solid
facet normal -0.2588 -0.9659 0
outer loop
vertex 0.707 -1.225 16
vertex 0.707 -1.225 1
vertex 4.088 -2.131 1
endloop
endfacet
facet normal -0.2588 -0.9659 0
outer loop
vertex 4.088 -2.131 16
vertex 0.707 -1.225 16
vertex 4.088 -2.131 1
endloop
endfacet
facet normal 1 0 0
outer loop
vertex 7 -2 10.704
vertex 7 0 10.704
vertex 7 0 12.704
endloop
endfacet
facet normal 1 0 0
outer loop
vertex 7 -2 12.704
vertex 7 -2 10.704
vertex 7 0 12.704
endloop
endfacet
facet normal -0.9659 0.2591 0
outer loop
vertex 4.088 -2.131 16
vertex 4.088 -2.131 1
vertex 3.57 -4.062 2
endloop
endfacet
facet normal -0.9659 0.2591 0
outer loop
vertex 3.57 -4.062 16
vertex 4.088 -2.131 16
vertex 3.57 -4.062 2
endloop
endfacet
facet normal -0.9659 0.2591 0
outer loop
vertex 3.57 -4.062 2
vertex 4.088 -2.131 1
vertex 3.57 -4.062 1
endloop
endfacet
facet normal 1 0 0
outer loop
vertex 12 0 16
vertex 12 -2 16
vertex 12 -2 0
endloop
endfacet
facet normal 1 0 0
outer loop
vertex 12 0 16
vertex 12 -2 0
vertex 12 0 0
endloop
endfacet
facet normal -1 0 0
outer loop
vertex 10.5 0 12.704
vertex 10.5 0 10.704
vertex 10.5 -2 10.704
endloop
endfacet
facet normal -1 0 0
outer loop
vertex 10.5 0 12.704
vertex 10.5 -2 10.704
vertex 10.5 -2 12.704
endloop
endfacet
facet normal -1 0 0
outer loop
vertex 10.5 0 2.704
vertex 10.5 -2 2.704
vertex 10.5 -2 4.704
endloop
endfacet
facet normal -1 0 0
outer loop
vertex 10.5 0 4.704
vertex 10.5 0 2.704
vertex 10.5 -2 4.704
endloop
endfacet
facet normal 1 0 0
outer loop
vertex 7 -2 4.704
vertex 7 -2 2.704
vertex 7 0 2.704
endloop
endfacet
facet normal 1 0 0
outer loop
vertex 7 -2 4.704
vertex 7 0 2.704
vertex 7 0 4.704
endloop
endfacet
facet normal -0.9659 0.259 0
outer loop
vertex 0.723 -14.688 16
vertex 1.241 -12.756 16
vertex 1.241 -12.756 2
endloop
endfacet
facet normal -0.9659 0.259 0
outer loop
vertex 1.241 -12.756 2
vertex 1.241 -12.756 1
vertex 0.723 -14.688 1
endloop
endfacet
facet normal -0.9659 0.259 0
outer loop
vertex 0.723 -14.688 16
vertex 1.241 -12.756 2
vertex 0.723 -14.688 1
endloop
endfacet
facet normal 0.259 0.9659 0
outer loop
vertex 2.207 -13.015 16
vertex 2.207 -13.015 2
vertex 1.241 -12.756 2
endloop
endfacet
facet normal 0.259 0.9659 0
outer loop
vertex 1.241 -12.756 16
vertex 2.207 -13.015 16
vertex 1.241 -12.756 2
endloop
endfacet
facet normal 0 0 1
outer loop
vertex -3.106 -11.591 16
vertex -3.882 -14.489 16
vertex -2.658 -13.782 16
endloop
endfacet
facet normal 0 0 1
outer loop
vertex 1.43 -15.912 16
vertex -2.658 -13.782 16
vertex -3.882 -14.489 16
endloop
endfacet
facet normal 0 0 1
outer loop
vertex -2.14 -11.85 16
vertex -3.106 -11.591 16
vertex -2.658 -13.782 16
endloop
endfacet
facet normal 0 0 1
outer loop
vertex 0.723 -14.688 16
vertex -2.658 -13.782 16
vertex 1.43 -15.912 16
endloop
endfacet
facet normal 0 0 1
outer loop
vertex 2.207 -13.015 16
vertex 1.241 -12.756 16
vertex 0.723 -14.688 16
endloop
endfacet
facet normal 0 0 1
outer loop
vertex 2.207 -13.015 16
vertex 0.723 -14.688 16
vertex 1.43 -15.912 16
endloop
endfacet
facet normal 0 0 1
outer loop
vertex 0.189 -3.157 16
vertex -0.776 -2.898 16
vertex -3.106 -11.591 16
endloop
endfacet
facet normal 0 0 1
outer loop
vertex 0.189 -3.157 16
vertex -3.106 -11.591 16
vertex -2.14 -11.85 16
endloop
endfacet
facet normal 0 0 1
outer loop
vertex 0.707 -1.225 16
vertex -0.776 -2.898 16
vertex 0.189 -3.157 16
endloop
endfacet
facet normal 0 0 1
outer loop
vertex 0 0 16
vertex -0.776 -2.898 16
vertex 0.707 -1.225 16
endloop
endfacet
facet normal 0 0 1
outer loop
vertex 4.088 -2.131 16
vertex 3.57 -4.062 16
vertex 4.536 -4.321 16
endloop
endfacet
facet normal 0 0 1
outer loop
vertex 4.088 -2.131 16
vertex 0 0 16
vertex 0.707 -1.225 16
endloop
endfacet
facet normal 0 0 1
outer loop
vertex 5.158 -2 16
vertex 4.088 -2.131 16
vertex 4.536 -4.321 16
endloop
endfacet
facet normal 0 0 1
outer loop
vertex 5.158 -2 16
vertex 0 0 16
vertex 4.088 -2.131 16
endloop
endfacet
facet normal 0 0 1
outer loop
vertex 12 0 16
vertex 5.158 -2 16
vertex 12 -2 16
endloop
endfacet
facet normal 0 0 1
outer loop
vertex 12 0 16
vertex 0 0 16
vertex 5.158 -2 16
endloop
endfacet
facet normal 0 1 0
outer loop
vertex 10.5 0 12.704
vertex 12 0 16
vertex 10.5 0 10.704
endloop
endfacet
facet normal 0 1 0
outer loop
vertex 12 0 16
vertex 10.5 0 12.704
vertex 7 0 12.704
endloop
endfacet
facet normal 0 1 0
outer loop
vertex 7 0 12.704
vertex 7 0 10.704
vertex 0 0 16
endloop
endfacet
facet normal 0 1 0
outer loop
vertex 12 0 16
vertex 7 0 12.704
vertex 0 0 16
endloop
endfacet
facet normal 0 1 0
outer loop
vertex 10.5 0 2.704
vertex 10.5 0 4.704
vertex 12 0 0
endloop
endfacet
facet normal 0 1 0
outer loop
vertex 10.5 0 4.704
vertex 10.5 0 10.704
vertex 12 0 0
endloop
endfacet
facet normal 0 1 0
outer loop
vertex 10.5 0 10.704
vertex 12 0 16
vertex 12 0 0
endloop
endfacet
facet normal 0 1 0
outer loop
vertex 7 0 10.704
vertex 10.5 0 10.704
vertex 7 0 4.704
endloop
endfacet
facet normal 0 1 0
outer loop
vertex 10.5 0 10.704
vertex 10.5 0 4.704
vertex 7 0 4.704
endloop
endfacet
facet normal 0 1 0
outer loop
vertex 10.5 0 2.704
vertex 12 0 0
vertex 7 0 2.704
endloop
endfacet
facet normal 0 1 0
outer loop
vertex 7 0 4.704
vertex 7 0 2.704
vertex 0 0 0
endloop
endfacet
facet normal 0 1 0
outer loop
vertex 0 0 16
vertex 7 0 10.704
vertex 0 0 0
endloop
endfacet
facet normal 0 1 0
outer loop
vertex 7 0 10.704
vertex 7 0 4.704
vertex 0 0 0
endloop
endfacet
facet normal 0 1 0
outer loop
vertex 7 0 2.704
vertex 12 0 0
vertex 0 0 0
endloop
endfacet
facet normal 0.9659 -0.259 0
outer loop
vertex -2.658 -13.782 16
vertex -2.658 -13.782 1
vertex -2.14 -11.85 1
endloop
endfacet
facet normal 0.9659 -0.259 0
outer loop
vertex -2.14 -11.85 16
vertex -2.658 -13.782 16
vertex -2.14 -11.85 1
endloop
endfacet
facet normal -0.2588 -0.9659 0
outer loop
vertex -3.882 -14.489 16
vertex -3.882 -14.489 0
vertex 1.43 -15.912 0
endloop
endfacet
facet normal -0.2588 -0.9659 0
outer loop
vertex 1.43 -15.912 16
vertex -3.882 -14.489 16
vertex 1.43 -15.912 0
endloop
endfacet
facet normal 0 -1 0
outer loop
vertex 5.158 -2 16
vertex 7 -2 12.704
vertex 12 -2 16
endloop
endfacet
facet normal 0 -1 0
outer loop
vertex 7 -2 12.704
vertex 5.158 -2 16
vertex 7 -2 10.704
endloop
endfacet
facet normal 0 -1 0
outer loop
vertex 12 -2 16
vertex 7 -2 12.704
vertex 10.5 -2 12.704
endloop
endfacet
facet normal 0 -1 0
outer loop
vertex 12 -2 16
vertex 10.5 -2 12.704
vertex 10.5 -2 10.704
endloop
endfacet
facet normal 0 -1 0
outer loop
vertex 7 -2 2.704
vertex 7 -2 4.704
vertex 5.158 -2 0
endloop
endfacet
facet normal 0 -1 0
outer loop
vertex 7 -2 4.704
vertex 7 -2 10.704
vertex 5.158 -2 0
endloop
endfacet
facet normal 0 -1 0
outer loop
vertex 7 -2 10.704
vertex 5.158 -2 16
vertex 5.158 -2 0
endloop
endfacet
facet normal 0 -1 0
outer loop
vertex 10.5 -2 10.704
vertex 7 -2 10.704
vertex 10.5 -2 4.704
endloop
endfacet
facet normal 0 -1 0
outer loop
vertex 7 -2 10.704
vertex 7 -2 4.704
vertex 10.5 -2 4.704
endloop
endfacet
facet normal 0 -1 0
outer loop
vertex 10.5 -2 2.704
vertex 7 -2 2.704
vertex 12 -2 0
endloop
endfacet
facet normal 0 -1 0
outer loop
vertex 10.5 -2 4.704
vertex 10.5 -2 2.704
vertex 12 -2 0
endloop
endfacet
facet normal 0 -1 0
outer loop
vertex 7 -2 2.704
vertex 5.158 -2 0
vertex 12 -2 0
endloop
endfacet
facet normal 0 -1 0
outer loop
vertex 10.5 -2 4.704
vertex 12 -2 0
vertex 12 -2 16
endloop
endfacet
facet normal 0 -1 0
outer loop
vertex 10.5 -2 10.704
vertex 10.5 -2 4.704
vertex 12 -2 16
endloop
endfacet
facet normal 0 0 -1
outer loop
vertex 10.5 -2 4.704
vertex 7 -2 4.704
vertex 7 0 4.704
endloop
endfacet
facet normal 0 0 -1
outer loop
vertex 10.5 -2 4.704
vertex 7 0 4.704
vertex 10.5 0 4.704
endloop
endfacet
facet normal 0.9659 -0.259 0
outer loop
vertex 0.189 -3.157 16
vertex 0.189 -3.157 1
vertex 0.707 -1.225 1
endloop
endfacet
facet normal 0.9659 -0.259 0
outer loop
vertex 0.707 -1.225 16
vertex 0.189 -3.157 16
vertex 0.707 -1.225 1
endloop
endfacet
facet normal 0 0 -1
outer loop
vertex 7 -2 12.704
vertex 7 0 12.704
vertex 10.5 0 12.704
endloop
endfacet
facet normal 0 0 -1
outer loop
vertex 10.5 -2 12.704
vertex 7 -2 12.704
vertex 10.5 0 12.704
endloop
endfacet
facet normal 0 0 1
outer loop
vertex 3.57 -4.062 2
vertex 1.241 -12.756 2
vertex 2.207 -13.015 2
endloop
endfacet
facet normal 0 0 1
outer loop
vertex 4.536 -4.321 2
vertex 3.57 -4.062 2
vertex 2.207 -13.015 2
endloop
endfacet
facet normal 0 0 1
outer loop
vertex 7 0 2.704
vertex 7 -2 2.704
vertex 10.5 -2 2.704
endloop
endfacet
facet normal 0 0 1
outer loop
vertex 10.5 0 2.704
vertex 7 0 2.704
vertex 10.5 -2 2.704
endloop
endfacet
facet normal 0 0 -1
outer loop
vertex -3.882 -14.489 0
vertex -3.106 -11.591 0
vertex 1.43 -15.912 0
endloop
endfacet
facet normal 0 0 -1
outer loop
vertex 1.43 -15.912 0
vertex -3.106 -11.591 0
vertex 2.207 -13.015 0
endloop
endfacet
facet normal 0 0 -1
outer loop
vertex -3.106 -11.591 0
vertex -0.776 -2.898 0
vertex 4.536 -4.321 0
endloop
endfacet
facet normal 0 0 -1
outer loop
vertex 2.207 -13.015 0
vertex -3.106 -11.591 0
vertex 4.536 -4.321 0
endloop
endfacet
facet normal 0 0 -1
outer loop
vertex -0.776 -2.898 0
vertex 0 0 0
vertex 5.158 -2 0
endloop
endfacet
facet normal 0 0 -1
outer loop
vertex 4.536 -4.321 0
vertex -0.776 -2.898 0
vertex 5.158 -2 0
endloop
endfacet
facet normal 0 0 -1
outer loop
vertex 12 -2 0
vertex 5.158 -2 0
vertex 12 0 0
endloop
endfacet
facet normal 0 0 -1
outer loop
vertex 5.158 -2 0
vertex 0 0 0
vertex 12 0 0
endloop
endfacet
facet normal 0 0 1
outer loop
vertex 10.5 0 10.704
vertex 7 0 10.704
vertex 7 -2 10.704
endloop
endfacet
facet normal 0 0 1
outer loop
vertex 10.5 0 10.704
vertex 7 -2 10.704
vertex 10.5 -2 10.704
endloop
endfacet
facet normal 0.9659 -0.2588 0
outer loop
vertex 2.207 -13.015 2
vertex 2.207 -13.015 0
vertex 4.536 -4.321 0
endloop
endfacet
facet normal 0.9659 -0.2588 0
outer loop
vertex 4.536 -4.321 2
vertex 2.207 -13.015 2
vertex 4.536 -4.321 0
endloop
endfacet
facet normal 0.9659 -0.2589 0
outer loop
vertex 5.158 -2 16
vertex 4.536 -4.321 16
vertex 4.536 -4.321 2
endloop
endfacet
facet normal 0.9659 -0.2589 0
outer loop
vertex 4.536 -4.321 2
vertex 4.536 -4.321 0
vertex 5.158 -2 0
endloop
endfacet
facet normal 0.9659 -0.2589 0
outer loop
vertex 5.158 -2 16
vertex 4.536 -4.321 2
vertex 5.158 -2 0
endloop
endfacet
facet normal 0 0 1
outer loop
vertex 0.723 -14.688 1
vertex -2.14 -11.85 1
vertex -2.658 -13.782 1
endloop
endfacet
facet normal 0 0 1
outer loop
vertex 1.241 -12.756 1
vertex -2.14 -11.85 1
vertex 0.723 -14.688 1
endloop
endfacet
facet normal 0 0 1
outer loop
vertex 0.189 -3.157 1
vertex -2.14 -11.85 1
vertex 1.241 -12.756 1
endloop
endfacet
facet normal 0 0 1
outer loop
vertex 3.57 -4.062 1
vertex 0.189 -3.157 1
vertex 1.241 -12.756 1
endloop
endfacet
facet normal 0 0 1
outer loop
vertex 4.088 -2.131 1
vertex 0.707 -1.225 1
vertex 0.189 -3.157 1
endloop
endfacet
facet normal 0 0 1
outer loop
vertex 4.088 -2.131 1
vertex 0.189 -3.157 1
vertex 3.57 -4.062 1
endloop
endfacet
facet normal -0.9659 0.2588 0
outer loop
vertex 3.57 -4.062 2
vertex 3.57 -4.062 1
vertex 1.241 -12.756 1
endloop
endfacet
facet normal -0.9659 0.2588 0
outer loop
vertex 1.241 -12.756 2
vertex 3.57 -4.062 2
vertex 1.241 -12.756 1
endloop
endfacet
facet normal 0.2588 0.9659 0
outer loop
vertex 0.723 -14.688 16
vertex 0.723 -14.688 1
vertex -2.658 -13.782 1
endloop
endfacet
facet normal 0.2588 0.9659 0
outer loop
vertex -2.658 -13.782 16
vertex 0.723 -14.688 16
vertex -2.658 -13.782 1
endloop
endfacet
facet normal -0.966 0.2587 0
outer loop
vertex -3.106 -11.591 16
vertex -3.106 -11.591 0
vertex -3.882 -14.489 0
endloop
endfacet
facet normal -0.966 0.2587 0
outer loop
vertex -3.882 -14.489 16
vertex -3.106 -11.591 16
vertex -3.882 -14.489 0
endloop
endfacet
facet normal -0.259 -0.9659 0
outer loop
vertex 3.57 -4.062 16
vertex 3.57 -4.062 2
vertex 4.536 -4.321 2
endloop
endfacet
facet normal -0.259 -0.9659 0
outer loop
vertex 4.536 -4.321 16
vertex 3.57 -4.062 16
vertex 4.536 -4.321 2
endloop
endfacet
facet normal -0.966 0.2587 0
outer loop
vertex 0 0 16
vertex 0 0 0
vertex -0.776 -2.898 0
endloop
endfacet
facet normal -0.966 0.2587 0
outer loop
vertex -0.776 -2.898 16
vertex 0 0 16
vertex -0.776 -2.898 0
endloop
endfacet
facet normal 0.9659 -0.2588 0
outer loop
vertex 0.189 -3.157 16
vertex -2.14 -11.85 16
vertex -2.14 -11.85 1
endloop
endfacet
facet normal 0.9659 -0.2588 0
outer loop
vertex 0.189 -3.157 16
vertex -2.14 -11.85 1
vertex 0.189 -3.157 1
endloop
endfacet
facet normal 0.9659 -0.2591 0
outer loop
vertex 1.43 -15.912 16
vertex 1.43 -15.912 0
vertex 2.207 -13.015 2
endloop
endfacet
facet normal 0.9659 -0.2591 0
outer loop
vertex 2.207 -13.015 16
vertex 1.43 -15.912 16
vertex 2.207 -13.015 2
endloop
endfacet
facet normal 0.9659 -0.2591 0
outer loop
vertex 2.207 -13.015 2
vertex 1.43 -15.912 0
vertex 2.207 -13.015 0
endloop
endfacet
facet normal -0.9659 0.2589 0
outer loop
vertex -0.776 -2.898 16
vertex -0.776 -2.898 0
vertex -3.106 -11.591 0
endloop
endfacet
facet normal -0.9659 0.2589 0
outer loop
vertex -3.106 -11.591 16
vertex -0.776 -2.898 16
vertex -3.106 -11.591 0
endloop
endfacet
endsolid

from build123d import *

# Parameters (mm, degrees)
F1_DEPTH = 16
F2_DEPTH = 1
F3_DEPTH = 2
F4_W     = 3.5
F4_H     = 2
F5_DEPTH = 2.5


with BuildPart() as f1:
    # F0 (on Top) → F1 (new body)
    with BuildSketch(Plane.XY):
        Polygon((5.312592, -1.423505), (0, 0), (-0.776457, -2.897777), (0.189469, -3.156597), (0.707107, -1.224745), (4.087847, -2.130612), (3.570209, -4.062463), (4.536135, -4.321282), (5.158121, -2), align=None)
        Polygon((-2.139903, -11.849929), (-3.105829, -11.59111), (-3.882286, -14.488887), (1.430306, -15.912392), (2.206764, -13.014615), (1.240838, -12.755796), (0.7232, -14.687647), (-2.657541, -13.781781), align=None)
        Polygon((0.189469, -3.156597), (-0.776457, -2.897777), (-3.105829, -11.59111), (-2.139903, -11.849929), align=None)
        Polygon((12, 0), (0, 0), (5.312592, -1.423505), (5.158121, -2), (12, -2), align=None)
    extrude(amount=F1_DEPTH)

    # F0 (on Top) → F2 (join)
    with BuildSketch(Plane.XY):
        Polygon((0.707107, -1.224745), (0.189469, -3.156597), (-2.139903, -11.849929), (-2.657541, -13.781781), (0.7232, -14.687647), (1.240838, -12.755796), (3.570209, -4.062463), (4.087847, -2.130612), align=None)
    extrude(amount=F2_DEPTH)

    # F0 (on Top) → F3 (join)
    with BuildSketch(Plane.XY):
        Polygon((2.206764, -13.014615), (4.536135, -4.321282), (3.570209, -4.062463), (1.240838, -12.755796), align=None)
    extrude(amount=F3_DEPTH)


with BuildPart() as f5:
    # F4 (on Front) → F5 (new body, symmetric)
    with BuildSketch(Plane.XZ):
        with Locations((16.25, 11.703817)):
            Rectangle(F4_W, F4_H)
        with Locations((16.25, 3.703817)):
            Rectangle(F4_W, F4_H)
    extrude(amount=F5_DEPTH, both=True)


with BuildPart() as f5_1:
    # F6: moved
    add(f5.part.moved(Location((-7.5, 0, 0))))


with BuildPart() as f1_1:
    add(f1.part)

    # F7: cut F5
    add(f5_1.part, mode=Mode.SUBTRACT)


solid = f1_1.part
